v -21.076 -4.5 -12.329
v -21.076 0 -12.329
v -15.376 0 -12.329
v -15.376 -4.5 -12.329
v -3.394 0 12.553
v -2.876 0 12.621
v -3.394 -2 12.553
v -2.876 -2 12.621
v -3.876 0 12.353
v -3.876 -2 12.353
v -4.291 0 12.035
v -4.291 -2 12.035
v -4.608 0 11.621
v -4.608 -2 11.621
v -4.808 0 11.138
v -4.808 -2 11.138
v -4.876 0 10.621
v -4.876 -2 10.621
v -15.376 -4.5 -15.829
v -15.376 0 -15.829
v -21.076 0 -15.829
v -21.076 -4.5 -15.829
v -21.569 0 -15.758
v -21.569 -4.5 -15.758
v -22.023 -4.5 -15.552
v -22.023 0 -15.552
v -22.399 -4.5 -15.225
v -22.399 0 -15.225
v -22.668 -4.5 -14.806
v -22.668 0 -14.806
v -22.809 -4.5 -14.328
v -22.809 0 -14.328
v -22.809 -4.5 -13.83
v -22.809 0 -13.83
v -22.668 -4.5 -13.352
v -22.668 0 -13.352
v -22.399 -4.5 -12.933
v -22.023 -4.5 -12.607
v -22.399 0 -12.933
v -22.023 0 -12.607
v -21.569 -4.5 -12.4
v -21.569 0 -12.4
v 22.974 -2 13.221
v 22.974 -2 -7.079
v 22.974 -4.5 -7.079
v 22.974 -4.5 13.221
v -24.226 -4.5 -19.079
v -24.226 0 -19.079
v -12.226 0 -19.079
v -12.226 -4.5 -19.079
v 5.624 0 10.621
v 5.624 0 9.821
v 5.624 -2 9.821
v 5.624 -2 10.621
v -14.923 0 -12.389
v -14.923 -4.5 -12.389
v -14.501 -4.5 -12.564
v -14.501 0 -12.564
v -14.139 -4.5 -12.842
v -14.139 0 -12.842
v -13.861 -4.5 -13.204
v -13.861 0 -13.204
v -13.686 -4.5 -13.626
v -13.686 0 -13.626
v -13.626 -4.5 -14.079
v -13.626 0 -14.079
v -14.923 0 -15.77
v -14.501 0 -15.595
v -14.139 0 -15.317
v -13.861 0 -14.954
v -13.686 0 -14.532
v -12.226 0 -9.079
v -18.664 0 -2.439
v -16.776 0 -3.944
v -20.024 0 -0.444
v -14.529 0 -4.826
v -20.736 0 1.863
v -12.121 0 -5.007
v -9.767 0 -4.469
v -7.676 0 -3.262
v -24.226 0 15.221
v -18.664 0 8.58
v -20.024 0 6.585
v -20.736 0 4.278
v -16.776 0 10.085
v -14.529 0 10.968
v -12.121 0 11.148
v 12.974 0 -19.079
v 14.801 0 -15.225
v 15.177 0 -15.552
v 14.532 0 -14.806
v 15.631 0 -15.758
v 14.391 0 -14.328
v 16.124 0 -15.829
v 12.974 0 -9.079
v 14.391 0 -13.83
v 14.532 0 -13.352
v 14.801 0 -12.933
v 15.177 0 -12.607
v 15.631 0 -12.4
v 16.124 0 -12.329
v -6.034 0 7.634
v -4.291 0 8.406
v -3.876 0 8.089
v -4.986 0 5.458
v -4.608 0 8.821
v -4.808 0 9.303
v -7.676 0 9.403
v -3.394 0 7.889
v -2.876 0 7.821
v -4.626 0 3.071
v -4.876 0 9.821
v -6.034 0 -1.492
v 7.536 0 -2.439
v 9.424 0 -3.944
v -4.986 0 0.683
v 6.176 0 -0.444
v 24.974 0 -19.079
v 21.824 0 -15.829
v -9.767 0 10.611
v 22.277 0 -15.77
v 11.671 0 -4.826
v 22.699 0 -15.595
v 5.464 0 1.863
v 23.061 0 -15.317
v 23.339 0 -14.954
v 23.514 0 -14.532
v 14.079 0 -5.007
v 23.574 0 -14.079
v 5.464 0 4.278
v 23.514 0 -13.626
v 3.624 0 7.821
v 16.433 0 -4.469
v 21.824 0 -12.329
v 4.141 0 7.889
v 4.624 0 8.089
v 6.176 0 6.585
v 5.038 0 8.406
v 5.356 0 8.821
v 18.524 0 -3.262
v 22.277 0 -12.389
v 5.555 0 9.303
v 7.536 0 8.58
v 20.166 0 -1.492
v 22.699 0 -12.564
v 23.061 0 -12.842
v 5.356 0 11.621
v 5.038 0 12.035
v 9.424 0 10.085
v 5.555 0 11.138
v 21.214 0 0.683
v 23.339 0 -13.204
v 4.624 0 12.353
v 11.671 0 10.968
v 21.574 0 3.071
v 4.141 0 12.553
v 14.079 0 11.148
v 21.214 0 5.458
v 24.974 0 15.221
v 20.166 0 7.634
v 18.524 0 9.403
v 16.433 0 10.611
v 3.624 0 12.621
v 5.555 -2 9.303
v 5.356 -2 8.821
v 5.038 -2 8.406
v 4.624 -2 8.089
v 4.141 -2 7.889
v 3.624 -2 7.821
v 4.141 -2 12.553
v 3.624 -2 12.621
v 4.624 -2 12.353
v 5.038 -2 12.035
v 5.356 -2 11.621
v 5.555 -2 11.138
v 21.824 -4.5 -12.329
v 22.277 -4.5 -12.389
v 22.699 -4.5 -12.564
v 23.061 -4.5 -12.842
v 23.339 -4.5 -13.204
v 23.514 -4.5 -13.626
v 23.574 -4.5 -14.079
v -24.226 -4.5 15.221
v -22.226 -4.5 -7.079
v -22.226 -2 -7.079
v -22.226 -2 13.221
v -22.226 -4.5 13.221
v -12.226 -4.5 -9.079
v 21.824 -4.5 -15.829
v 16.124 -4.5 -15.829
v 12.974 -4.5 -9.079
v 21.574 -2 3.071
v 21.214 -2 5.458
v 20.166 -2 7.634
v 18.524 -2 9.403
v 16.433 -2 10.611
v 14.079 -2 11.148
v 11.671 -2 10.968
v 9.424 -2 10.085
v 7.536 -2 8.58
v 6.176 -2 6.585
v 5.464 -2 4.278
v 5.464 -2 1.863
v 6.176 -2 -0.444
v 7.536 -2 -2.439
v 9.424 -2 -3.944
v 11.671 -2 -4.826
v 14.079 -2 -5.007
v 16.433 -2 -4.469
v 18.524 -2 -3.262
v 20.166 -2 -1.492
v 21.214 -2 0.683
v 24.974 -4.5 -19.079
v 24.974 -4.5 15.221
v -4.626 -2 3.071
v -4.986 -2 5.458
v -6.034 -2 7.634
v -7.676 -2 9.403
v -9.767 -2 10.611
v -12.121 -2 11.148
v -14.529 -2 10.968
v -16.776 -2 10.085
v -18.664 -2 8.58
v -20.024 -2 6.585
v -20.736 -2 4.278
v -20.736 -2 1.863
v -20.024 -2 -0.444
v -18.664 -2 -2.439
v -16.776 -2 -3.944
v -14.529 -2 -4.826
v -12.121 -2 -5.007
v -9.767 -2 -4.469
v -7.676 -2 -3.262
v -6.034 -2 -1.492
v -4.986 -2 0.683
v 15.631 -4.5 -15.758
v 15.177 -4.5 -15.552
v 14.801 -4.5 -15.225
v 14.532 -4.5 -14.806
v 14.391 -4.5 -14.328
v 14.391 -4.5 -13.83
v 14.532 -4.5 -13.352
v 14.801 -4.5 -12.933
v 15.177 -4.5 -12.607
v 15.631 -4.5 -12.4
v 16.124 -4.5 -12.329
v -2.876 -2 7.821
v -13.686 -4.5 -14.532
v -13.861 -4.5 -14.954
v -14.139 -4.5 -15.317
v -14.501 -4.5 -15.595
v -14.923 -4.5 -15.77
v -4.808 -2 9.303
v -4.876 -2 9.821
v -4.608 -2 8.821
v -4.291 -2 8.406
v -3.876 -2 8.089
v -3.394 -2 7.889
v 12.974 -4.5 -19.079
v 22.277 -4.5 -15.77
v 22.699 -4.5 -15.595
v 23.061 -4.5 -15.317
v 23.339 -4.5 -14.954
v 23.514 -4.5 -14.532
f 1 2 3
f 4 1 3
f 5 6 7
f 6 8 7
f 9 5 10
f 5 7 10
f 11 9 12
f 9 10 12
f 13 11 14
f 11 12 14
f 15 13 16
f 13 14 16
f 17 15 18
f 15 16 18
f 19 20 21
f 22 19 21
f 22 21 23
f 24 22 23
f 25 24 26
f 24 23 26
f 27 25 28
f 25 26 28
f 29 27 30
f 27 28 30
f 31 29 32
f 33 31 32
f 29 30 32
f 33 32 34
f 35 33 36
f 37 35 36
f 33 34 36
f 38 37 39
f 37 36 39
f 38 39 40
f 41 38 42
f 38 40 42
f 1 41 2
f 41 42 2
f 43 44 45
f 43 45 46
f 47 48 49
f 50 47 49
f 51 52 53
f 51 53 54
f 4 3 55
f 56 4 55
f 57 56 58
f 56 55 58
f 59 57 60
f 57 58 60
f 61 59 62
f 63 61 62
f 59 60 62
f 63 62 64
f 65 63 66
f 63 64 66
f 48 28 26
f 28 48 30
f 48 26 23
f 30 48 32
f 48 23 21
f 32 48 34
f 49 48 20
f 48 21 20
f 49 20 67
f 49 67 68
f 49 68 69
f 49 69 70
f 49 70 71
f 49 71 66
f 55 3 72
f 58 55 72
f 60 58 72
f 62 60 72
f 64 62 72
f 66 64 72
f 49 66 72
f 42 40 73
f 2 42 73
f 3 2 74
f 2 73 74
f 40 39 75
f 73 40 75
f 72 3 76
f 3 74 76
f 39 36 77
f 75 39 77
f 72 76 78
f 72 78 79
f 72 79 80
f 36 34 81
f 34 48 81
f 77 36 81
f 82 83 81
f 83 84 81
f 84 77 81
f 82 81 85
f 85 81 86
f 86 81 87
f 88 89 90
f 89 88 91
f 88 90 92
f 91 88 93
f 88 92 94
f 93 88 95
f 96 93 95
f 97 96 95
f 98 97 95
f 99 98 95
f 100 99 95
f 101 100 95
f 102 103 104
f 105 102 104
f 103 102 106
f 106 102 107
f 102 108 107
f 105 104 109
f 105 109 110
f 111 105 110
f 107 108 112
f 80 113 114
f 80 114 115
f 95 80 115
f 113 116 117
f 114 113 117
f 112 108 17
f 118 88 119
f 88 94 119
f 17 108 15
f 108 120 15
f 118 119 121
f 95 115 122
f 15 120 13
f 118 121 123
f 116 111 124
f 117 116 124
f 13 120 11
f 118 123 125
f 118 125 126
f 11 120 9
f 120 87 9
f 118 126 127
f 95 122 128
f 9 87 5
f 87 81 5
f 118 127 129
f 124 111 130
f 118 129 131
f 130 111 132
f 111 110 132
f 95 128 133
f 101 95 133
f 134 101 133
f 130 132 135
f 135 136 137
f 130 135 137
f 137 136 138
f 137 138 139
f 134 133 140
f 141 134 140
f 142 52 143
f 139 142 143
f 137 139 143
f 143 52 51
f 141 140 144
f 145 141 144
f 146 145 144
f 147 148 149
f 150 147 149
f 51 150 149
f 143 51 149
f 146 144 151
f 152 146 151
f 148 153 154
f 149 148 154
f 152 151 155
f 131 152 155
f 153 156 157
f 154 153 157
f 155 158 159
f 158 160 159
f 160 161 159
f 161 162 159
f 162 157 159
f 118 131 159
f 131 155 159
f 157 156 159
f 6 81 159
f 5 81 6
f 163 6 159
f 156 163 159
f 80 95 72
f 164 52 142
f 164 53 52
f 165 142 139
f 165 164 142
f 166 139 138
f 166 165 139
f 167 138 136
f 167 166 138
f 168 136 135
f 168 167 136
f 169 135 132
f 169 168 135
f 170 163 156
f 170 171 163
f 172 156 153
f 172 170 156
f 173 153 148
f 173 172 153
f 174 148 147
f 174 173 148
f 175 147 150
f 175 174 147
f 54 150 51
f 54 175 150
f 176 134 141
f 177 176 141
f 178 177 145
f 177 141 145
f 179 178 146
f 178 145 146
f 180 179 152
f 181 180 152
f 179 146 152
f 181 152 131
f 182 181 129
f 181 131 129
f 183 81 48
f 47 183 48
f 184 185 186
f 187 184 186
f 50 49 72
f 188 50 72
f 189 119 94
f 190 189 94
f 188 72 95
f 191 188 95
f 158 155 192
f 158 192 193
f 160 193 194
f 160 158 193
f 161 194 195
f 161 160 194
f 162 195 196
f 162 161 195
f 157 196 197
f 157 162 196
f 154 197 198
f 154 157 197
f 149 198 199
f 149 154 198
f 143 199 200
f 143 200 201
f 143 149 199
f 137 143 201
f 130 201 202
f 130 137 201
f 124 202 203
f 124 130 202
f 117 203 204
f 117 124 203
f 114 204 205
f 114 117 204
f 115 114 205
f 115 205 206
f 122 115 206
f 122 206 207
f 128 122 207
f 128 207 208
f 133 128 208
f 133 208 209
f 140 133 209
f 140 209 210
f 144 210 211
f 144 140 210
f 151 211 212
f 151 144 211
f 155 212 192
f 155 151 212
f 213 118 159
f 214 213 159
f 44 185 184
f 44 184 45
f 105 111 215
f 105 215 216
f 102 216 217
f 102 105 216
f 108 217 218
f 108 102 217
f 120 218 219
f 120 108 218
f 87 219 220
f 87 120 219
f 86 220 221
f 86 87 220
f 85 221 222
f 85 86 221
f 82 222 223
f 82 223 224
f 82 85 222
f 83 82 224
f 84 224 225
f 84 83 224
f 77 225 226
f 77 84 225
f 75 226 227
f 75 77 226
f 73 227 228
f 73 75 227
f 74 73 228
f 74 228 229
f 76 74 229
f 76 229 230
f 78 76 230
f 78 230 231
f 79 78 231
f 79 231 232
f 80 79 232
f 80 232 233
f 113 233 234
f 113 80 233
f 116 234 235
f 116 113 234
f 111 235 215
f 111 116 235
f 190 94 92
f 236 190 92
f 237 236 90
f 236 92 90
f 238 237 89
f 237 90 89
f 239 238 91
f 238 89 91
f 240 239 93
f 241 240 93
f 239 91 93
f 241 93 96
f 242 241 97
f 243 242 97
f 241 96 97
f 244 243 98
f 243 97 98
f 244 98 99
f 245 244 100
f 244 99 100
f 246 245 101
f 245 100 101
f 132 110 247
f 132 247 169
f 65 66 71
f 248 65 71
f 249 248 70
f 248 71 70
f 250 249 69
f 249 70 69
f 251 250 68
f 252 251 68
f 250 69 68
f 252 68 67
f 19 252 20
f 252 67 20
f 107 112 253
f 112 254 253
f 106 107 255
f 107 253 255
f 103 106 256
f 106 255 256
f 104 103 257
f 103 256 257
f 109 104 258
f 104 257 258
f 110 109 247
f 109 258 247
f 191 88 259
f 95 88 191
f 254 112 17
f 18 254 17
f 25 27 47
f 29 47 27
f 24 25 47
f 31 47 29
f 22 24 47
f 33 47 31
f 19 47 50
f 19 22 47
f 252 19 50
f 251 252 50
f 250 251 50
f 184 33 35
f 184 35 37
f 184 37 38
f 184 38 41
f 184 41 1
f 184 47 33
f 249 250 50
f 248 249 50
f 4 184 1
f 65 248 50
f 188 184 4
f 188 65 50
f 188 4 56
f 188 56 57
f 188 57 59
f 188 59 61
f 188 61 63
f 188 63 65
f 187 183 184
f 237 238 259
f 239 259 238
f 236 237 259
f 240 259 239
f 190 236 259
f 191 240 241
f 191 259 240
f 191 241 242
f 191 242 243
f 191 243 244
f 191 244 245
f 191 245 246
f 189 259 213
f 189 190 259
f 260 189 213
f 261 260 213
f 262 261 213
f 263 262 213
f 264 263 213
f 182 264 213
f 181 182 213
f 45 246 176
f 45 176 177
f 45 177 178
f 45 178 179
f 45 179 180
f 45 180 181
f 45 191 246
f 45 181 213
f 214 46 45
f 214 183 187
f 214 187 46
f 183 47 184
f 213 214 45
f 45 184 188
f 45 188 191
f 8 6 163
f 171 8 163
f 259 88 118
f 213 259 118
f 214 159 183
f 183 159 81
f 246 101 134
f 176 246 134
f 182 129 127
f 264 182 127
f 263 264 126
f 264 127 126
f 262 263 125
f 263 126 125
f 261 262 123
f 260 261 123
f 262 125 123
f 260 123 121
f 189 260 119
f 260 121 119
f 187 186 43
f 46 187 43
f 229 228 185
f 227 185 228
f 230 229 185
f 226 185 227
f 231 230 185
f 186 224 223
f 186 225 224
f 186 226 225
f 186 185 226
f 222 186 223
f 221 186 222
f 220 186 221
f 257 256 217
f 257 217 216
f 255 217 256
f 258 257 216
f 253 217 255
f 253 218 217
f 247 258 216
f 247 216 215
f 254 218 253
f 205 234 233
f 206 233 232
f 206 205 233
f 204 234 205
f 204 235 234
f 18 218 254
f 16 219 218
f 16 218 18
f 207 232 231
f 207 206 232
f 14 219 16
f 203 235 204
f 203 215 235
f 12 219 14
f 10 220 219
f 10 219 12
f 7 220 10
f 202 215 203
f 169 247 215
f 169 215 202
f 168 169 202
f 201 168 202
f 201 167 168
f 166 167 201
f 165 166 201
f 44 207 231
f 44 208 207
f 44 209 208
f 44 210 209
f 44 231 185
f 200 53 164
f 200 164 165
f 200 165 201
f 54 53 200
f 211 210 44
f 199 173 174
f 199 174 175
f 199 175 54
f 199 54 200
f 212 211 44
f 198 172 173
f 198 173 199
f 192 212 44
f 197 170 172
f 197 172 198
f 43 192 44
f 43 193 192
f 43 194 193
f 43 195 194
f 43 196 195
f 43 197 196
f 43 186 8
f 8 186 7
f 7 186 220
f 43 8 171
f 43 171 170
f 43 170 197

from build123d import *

# Parameters (mm, degrees)
F0_W     = 45.2
F0_H     = 20.3
F0_R     = 8.1
F0_W_2   = 10.5
F0_H_2   = 4.8
F1_DEPTH = 2
F0_W_3   = 12
F0_H_3   = 10
F2_DEPTH = 4.5
F3_R     = 2


# Not quite as in the source:
# - a feature names something its author has since deleted; it is built from what else it names


with BuildPart() as f1:
    # F0 (on Front) → F1 (new body)
    with BuildSketch(Plane.XZ):
        with Locations((0.3735902304, 3.0706598967)):
            Rectangle(F0_W, F0_H)
        with Locations((-12.7264097696, 3.0706598967)):
            Circle(F0_R, mode=Mode.SUBTRACT)
        with Locations((0.3735902304, 10.2206598967)):
            Rectangle(F0_W_2, F0_H_2, mode=Mode.SUBTRACT)
        with Locations((13.4735902304, 3.0706598967)):
            Circle(F0_R, mode=Mode.SUBTRACT)
    extrude(amount=F1_DEPTH)



with BuildPart() as f1b:
    # F0 (on Front) → F1, piece 2 (new body)
    with BuildSketch(Plane.XZ):
        with Locations((18.9735902304, -14.0793401033)):
            Rectangle(F0_W_3, F0_H_3)
        with BuildLine():
            ThreePointArc((16.1235902304, -15.8293401033), (14.3735902304, -14.0793401033), (16.1235902304, -12.3293401033))
            Line((16.1235902304, -12.3293401033), (21.8235902304, -12.3293401033))
            ThreePointArc((21.8235902304, -12.3293401033), (23.0610270975, -12.8419032362), (23.5735902304, -14.0793401033))
            ThreePointArc((23.5735902304, -14.0793401033), (23.0610270975, -15.3167769703), (21.8235902304, -15.8293401033))
            Line((21.8235902304, -15.8293401033), (16.1235902304, -15.8293401033))
        make_face(mode=Mode.SUBTRACT)
    extrude(amount=F1_DEPTH)


with BuildPart() as f1_1:
    add(f1.part)

    add(f1b.part)  # F2 merges F1b
    # F0 (on Front) → F2 (join)
    with BuildSketch(Plane.XZ):
        Polygon((24.9735902304, 15.2206598967), (-24.2264097696, 15.2206598967), (-24.2264097696, -9.0793401033), (-12.2264097696, -9.0793401033), (12.9735902304, -9.0793401033), (24.9735902304, -9.0793401033), align=None)
        with Locations((0.3735902304, 3.0706598967)):
            Rectangle(F0_W, F0_H, mode=Mode.SUBTRACT)
        with Locations((-18.2264097696, -14.0793401033)):
            Rectangle(F0_W_3, F0_H_3)
        with BuildLine():
            Line((-21.0764097696, -12.3293401033), (-15.3764097696, -12.3293401033))
            ThreePointArc((-15.3764097696, -12.3293401033), (-14.1389729025, -12.8419032362), (-13.6264097696, -14.0793401033))
            ThreePointArc((-13.6264097696, -14.0793401033), (-14.1389729025, -15.3167769703), (-15.3764097696, -15.8293401033))
            Line((-15.3764097696, -15.8293401033), (-21.0764097696, -15.8293401033))
            ThreePointArc((-21.0764097696, -15.8293401033), (-22.8264097696, -14.0793401033), (-21.0764097696, -12.3293401033))
        make_face(mode=Mode.SUBTRACT)
        with Locations((18.9735902304, -14.0793401033)):
            Rectangle(F0_W_3, F0_H_3)
        with BuildLine():
            ThreePointArc((16.1235902304, -15.8293401033), (14.3735902304, -14.0793401033), (16.1235902304, -12.3293401033))
            Line((16.1235902304, -12.3293401033), (21.8235902304, -12.3293401033))
            ThreePointArc((21.8235902304, -12.3293401033), (23.0610270975, -12.8419032362), (23.5735902304, -14.0793401033))
            ThreePointArc((23.5735902304, -14.0793401033), (23.0610270975, -15.3167769703), (21.8235902304, -15.8293401033))
            Line((21.8235902304, -15.8293401033), (16.1235902304, -15.8293401033))
        make_face(mode=Mode.SUBTRACT)
    extrude(amount=F2_DEPTH)

    # F3
    f3_edges = [f1_1.edges().sort_by_distance(p)[0] for p in [
        (-4.87641, -1, 7.82066),
        (-4.87641, -1, 12.62066),
        (5.62359, -1, 12.62066),
        (5.62359, -1, 7.82066),
    ]]
    fillet(f3_edges, radius=F3_R)


solid = f1_1.part
